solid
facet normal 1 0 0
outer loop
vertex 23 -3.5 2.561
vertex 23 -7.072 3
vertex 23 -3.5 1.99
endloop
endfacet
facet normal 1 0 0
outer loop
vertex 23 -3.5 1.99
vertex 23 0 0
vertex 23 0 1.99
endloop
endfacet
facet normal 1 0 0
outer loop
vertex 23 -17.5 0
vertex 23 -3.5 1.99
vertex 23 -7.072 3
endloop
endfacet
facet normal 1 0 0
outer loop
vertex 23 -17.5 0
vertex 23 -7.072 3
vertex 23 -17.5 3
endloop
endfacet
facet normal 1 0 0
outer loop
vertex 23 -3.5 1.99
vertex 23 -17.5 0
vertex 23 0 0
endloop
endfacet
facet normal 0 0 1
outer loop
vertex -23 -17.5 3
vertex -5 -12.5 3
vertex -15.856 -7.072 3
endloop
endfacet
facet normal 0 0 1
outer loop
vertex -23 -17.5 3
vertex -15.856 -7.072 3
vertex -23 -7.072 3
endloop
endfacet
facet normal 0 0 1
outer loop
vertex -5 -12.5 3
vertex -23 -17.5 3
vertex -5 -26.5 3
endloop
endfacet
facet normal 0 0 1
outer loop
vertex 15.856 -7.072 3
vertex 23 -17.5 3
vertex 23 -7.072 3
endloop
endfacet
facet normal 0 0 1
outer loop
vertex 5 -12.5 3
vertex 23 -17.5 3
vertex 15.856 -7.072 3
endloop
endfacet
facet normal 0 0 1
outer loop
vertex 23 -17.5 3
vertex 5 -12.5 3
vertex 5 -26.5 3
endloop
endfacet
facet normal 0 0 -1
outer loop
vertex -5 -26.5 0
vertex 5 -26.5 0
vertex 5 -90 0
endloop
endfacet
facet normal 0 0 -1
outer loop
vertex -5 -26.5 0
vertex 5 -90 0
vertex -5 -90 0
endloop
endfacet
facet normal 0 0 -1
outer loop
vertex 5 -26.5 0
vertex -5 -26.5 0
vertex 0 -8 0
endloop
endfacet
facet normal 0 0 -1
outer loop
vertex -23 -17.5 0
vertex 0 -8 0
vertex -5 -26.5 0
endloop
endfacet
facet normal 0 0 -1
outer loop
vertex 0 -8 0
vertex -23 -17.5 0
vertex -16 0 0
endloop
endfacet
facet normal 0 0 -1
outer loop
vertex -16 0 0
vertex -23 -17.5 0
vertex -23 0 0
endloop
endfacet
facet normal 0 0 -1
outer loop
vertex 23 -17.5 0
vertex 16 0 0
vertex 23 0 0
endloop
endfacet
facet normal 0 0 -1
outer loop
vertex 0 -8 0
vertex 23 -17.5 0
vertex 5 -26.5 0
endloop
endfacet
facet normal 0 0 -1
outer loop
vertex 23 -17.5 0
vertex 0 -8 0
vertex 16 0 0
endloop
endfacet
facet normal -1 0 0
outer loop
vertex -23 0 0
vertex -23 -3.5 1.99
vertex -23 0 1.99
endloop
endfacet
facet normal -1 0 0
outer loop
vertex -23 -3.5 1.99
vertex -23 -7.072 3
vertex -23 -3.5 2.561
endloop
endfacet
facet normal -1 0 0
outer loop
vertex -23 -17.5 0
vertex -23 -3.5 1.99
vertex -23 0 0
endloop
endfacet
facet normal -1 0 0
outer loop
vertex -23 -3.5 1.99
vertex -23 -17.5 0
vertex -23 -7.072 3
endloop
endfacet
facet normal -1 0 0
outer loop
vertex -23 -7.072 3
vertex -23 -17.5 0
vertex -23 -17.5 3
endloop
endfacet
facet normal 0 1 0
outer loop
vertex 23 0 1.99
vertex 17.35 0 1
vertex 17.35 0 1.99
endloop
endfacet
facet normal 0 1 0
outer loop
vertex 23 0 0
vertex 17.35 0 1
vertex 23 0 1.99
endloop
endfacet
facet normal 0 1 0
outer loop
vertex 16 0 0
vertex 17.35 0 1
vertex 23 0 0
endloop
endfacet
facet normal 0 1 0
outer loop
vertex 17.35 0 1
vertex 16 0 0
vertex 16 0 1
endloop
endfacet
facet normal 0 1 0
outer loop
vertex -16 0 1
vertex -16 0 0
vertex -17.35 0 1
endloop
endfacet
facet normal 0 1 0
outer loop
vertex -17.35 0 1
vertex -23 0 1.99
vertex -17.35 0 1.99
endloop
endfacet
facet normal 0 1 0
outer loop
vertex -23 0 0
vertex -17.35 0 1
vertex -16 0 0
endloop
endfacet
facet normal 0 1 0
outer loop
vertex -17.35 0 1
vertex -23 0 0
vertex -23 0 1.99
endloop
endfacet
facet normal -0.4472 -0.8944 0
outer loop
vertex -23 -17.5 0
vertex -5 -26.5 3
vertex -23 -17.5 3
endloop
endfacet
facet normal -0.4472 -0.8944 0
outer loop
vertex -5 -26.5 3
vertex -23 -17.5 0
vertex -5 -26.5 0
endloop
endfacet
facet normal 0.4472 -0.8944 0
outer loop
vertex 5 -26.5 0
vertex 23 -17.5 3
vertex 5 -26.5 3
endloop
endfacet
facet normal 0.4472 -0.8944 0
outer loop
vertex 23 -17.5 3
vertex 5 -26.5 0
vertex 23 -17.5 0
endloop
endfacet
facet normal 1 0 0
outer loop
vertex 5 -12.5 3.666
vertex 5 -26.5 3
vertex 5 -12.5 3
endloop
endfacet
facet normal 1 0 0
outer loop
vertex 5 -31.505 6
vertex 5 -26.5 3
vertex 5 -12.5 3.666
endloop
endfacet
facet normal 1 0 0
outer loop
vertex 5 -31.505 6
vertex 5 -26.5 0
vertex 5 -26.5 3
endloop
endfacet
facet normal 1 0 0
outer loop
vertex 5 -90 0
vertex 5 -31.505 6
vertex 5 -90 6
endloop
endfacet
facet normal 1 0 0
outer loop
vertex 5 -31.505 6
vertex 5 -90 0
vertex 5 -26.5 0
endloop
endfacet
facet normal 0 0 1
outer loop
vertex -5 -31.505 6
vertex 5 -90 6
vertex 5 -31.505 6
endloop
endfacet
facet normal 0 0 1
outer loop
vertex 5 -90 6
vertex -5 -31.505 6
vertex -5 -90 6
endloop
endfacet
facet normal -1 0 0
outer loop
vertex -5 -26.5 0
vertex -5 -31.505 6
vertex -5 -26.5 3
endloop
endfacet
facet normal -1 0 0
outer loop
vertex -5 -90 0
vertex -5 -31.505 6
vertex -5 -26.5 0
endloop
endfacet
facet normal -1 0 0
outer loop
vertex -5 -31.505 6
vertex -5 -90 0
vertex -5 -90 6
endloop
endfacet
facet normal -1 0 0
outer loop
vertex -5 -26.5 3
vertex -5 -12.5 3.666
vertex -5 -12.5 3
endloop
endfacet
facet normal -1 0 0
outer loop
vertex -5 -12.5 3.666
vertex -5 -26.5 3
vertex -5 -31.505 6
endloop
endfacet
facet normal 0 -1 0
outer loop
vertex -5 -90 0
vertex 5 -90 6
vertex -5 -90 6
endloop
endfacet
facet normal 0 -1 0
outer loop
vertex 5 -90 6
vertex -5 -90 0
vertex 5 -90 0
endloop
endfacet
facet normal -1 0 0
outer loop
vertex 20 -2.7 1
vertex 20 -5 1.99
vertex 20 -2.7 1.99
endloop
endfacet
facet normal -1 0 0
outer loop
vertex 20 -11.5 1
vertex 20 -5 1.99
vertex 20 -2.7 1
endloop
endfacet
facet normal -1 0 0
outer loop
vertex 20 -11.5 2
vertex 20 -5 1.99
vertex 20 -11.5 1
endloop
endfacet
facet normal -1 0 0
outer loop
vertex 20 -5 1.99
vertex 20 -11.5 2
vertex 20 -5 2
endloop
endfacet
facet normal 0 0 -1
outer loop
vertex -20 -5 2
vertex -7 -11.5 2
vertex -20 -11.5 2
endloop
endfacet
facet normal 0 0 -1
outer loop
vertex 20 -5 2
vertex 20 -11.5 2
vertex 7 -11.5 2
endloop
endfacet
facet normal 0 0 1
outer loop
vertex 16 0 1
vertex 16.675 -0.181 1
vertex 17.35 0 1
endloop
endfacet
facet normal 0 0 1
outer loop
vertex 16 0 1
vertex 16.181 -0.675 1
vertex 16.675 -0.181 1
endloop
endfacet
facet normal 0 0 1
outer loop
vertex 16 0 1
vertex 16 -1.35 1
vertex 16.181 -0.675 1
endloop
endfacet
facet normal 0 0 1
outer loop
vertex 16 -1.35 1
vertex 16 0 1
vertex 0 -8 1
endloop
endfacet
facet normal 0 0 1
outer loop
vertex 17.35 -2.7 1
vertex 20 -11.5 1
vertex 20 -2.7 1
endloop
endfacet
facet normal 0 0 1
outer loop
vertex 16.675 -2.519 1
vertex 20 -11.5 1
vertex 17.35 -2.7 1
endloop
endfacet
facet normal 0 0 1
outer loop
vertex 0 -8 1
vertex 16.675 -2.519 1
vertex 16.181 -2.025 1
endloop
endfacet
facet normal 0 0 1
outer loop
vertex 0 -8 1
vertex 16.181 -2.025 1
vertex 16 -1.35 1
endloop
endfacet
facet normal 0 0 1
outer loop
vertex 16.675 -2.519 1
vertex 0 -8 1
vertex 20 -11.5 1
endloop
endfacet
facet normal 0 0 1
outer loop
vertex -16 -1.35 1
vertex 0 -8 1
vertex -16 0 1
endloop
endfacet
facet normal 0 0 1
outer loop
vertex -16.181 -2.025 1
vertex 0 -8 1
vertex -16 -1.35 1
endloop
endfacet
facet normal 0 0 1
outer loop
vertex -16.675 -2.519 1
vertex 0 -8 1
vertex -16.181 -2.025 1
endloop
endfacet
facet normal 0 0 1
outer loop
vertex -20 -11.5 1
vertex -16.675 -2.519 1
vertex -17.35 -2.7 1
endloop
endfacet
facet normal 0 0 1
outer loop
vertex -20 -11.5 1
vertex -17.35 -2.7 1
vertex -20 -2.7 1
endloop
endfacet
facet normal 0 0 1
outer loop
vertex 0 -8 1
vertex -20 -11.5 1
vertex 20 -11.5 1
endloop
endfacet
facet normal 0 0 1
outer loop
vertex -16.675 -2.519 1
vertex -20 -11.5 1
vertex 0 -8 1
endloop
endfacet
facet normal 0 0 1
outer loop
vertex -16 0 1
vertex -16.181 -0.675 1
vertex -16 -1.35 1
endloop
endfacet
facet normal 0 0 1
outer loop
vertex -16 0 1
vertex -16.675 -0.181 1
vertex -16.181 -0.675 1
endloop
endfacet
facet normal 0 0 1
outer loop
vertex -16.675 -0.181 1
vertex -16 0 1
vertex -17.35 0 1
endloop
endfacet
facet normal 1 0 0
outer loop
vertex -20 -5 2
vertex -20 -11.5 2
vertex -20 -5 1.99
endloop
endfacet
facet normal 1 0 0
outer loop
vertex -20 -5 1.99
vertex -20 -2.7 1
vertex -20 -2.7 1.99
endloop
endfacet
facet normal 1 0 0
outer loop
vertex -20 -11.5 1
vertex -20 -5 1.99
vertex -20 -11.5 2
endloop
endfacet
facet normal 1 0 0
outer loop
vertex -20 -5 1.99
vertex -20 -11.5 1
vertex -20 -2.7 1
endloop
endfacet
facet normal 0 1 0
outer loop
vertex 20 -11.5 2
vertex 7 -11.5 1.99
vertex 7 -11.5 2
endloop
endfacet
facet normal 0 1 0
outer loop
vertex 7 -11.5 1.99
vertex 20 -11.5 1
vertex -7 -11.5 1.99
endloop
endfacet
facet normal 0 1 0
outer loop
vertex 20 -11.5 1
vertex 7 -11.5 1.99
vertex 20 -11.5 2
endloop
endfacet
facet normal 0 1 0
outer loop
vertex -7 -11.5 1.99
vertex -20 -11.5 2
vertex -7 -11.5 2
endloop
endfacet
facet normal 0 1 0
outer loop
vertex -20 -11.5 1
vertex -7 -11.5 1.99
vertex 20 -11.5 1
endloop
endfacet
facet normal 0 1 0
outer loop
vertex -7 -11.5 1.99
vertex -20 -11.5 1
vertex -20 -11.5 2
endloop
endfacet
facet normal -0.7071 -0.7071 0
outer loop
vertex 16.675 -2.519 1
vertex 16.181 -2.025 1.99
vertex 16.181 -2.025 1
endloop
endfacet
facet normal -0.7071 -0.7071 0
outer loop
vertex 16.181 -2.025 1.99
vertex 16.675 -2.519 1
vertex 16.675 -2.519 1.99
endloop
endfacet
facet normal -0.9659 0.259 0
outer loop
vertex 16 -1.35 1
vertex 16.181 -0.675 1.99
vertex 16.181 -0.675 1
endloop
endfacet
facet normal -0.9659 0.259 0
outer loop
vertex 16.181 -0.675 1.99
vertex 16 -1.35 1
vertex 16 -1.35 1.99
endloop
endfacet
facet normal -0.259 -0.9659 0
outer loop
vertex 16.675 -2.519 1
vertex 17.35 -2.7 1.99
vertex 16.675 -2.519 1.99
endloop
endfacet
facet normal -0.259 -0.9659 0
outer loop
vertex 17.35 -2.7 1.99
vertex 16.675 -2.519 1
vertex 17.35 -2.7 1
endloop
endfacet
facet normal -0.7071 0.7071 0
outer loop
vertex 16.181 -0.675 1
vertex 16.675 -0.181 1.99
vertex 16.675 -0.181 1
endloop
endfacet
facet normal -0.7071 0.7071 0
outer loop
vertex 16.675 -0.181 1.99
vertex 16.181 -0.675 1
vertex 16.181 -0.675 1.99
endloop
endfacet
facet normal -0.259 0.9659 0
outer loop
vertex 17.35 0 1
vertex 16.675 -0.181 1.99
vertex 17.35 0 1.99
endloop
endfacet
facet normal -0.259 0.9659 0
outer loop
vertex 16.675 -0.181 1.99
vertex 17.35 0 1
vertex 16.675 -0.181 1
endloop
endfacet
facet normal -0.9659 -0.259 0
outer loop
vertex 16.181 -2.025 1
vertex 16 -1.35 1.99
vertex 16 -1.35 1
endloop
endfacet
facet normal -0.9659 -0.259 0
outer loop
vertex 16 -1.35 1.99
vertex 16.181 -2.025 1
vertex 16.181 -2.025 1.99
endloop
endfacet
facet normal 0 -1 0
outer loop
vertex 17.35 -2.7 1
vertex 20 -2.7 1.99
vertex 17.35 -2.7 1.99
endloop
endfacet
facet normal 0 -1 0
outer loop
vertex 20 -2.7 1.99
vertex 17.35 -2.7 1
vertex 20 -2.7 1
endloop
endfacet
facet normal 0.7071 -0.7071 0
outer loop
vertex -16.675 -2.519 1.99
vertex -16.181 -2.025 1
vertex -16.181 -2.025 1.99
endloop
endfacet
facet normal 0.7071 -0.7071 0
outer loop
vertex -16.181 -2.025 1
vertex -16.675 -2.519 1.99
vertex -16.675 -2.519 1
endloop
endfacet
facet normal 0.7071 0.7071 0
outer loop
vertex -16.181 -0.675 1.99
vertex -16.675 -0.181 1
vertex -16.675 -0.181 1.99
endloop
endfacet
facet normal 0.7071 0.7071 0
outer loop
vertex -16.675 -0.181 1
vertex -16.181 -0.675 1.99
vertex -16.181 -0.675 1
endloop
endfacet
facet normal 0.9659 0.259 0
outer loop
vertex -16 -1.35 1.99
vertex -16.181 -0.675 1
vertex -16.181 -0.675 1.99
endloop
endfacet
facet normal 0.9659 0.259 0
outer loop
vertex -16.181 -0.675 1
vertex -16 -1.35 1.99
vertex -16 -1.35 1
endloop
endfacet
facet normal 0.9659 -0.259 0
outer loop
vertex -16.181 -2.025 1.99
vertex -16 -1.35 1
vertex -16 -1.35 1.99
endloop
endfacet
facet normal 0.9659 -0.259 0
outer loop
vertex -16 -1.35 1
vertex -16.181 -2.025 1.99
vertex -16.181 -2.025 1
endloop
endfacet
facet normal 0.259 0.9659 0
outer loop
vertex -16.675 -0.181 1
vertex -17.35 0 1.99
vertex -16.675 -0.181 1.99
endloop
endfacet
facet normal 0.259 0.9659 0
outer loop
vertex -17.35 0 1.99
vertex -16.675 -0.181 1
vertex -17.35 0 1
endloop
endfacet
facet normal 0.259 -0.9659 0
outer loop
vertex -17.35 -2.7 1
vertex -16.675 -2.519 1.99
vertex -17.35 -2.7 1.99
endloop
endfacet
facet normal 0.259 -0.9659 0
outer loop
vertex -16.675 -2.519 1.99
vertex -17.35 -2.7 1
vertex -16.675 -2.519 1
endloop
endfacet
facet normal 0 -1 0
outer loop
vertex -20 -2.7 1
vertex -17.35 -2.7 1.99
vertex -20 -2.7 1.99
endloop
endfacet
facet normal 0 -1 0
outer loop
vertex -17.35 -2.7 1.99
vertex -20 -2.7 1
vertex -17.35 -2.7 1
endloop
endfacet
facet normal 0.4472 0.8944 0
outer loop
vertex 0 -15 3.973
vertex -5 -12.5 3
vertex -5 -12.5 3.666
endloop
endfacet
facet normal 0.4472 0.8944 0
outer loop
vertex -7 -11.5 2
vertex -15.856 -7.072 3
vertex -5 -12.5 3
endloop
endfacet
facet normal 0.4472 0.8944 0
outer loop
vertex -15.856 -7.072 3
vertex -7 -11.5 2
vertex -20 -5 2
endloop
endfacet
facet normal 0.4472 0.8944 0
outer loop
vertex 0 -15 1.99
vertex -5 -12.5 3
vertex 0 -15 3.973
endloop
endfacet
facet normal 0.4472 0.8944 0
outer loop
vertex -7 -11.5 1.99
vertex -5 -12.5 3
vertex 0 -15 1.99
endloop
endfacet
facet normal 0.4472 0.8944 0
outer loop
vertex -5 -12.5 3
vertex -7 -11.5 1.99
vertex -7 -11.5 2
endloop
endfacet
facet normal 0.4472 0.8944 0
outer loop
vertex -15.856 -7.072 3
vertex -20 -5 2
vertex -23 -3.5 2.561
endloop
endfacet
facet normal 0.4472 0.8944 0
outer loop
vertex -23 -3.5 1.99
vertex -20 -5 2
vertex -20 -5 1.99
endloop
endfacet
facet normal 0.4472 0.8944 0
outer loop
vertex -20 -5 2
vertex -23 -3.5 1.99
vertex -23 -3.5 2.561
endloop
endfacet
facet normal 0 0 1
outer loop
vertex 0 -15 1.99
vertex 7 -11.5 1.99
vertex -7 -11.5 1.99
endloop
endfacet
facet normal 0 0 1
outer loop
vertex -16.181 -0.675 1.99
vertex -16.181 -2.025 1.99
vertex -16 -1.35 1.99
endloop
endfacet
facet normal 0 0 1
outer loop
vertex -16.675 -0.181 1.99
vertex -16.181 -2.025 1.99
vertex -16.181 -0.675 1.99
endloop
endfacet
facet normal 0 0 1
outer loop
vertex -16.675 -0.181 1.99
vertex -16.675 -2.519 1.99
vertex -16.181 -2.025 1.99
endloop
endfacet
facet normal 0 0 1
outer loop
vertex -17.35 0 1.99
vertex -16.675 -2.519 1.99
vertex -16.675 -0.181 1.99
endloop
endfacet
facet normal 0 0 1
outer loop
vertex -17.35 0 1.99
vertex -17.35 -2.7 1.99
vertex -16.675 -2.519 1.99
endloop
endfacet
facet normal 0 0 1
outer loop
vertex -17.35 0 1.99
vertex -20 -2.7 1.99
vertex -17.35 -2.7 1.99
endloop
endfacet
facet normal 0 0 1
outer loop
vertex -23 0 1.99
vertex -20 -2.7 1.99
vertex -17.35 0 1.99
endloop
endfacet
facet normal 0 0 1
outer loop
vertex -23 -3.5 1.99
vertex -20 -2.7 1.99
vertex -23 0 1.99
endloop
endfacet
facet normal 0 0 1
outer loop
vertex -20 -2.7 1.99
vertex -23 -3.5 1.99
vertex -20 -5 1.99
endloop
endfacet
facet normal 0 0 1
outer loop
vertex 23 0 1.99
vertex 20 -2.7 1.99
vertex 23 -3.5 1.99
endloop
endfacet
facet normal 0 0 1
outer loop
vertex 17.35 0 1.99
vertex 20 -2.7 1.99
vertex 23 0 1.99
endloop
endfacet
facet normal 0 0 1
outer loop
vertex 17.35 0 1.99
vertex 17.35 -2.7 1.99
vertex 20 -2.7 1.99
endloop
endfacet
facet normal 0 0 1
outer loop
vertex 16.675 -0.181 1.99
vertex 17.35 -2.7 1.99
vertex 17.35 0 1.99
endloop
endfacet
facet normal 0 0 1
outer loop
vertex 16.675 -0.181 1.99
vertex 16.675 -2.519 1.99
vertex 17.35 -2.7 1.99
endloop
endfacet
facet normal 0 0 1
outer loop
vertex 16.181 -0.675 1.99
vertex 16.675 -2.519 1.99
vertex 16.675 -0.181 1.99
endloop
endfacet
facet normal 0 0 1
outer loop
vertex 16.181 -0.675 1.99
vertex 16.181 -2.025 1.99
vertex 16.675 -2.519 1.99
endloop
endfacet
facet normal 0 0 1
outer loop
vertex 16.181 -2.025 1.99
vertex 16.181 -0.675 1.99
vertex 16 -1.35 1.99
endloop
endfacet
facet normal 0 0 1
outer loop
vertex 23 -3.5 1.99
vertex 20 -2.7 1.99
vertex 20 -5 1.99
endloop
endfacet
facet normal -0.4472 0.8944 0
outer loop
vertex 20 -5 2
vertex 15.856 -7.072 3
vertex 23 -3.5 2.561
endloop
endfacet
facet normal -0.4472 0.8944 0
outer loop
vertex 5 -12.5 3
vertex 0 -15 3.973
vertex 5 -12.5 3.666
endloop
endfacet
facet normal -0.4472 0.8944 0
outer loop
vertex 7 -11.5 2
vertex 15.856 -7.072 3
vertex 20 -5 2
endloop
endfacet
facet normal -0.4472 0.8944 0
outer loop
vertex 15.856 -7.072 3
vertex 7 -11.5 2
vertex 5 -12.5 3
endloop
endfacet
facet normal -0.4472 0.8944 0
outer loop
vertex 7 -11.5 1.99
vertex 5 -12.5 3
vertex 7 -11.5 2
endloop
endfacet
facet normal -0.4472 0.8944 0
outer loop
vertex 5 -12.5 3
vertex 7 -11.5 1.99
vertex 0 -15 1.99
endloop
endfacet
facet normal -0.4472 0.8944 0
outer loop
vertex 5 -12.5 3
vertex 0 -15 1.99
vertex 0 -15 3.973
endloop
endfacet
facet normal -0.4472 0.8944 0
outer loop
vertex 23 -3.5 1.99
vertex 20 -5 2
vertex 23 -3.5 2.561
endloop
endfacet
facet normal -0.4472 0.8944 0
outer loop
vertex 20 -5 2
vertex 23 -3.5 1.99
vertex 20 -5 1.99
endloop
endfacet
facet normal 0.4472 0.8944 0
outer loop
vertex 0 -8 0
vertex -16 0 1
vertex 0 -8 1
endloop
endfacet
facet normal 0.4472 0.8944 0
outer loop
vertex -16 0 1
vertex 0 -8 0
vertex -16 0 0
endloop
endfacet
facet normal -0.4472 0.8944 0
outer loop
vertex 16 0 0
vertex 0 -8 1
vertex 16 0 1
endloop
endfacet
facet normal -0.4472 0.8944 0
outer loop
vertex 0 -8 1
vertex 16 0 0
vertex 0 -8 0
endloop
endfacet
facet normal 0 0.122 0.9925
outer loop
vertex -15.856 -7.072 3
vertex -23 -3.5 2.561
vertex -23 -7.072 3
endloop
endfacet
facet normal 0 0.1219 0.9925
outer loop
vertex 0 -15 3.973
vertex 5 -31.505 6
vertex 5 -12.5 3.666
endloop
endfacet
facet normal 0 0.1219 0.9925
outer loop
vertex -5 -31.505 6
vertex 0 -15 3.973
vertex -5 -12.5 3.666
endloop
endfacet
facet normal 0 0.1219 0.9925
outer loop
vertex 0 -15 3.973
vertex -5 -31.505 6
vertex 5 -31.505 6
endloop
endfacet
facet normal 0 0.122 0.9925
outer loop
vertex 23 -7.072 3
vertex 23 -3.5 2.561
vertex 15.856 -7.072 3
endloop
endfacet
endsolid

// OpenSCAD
// Razor scraper

w=40;// width of razor
l=11.5;// length to stops
t=1;// thickness of razor
d=2.7;// diameter of stops
w1=4;// width of stops

difference(){
	union(){
		translate([0,-l/2-3,3/2])cube([w+6,l+6,3],center=true);
		translate([0,-l-6,1.5])scale([1,0.5,1])rotate([0,0,45])
			cube([(w+6)/sqrt(2),(w+6)/sqrt(2),3],center=true);
		translate([-5,-90,0])cube([10,80,6]);
	}
	difference(){
		translate([0,0,t/2+1])cube([w,2*l,t],center=true);
		translate([w/2-w1+d/2,-d/2,0])cylinder(r=d/2,h=3*t,$fn=12);
		translate([w/2-w1+d/2,-d,0])cube([2*w1,d,3*t]);
		translate([-(w/2-w1+d/2),-d/2,0])cylinder(r=d/2,h=3*t,$fn=12);
		translate([-w/2-w1-d/2,-d,0])cube([2*w1,d,3*t]);
	}
	translate([0,-15,2-0.01])scale([1,0.5,1])rotate([0,0,45])cube(2*w);
	translate([0,-8,-0.01])scale([1,0.5,1])rotate([0,0,45])cube(2*w);
	translate([-w,-3,2.5])rotate([83,0,0])cube(2*w);
}
